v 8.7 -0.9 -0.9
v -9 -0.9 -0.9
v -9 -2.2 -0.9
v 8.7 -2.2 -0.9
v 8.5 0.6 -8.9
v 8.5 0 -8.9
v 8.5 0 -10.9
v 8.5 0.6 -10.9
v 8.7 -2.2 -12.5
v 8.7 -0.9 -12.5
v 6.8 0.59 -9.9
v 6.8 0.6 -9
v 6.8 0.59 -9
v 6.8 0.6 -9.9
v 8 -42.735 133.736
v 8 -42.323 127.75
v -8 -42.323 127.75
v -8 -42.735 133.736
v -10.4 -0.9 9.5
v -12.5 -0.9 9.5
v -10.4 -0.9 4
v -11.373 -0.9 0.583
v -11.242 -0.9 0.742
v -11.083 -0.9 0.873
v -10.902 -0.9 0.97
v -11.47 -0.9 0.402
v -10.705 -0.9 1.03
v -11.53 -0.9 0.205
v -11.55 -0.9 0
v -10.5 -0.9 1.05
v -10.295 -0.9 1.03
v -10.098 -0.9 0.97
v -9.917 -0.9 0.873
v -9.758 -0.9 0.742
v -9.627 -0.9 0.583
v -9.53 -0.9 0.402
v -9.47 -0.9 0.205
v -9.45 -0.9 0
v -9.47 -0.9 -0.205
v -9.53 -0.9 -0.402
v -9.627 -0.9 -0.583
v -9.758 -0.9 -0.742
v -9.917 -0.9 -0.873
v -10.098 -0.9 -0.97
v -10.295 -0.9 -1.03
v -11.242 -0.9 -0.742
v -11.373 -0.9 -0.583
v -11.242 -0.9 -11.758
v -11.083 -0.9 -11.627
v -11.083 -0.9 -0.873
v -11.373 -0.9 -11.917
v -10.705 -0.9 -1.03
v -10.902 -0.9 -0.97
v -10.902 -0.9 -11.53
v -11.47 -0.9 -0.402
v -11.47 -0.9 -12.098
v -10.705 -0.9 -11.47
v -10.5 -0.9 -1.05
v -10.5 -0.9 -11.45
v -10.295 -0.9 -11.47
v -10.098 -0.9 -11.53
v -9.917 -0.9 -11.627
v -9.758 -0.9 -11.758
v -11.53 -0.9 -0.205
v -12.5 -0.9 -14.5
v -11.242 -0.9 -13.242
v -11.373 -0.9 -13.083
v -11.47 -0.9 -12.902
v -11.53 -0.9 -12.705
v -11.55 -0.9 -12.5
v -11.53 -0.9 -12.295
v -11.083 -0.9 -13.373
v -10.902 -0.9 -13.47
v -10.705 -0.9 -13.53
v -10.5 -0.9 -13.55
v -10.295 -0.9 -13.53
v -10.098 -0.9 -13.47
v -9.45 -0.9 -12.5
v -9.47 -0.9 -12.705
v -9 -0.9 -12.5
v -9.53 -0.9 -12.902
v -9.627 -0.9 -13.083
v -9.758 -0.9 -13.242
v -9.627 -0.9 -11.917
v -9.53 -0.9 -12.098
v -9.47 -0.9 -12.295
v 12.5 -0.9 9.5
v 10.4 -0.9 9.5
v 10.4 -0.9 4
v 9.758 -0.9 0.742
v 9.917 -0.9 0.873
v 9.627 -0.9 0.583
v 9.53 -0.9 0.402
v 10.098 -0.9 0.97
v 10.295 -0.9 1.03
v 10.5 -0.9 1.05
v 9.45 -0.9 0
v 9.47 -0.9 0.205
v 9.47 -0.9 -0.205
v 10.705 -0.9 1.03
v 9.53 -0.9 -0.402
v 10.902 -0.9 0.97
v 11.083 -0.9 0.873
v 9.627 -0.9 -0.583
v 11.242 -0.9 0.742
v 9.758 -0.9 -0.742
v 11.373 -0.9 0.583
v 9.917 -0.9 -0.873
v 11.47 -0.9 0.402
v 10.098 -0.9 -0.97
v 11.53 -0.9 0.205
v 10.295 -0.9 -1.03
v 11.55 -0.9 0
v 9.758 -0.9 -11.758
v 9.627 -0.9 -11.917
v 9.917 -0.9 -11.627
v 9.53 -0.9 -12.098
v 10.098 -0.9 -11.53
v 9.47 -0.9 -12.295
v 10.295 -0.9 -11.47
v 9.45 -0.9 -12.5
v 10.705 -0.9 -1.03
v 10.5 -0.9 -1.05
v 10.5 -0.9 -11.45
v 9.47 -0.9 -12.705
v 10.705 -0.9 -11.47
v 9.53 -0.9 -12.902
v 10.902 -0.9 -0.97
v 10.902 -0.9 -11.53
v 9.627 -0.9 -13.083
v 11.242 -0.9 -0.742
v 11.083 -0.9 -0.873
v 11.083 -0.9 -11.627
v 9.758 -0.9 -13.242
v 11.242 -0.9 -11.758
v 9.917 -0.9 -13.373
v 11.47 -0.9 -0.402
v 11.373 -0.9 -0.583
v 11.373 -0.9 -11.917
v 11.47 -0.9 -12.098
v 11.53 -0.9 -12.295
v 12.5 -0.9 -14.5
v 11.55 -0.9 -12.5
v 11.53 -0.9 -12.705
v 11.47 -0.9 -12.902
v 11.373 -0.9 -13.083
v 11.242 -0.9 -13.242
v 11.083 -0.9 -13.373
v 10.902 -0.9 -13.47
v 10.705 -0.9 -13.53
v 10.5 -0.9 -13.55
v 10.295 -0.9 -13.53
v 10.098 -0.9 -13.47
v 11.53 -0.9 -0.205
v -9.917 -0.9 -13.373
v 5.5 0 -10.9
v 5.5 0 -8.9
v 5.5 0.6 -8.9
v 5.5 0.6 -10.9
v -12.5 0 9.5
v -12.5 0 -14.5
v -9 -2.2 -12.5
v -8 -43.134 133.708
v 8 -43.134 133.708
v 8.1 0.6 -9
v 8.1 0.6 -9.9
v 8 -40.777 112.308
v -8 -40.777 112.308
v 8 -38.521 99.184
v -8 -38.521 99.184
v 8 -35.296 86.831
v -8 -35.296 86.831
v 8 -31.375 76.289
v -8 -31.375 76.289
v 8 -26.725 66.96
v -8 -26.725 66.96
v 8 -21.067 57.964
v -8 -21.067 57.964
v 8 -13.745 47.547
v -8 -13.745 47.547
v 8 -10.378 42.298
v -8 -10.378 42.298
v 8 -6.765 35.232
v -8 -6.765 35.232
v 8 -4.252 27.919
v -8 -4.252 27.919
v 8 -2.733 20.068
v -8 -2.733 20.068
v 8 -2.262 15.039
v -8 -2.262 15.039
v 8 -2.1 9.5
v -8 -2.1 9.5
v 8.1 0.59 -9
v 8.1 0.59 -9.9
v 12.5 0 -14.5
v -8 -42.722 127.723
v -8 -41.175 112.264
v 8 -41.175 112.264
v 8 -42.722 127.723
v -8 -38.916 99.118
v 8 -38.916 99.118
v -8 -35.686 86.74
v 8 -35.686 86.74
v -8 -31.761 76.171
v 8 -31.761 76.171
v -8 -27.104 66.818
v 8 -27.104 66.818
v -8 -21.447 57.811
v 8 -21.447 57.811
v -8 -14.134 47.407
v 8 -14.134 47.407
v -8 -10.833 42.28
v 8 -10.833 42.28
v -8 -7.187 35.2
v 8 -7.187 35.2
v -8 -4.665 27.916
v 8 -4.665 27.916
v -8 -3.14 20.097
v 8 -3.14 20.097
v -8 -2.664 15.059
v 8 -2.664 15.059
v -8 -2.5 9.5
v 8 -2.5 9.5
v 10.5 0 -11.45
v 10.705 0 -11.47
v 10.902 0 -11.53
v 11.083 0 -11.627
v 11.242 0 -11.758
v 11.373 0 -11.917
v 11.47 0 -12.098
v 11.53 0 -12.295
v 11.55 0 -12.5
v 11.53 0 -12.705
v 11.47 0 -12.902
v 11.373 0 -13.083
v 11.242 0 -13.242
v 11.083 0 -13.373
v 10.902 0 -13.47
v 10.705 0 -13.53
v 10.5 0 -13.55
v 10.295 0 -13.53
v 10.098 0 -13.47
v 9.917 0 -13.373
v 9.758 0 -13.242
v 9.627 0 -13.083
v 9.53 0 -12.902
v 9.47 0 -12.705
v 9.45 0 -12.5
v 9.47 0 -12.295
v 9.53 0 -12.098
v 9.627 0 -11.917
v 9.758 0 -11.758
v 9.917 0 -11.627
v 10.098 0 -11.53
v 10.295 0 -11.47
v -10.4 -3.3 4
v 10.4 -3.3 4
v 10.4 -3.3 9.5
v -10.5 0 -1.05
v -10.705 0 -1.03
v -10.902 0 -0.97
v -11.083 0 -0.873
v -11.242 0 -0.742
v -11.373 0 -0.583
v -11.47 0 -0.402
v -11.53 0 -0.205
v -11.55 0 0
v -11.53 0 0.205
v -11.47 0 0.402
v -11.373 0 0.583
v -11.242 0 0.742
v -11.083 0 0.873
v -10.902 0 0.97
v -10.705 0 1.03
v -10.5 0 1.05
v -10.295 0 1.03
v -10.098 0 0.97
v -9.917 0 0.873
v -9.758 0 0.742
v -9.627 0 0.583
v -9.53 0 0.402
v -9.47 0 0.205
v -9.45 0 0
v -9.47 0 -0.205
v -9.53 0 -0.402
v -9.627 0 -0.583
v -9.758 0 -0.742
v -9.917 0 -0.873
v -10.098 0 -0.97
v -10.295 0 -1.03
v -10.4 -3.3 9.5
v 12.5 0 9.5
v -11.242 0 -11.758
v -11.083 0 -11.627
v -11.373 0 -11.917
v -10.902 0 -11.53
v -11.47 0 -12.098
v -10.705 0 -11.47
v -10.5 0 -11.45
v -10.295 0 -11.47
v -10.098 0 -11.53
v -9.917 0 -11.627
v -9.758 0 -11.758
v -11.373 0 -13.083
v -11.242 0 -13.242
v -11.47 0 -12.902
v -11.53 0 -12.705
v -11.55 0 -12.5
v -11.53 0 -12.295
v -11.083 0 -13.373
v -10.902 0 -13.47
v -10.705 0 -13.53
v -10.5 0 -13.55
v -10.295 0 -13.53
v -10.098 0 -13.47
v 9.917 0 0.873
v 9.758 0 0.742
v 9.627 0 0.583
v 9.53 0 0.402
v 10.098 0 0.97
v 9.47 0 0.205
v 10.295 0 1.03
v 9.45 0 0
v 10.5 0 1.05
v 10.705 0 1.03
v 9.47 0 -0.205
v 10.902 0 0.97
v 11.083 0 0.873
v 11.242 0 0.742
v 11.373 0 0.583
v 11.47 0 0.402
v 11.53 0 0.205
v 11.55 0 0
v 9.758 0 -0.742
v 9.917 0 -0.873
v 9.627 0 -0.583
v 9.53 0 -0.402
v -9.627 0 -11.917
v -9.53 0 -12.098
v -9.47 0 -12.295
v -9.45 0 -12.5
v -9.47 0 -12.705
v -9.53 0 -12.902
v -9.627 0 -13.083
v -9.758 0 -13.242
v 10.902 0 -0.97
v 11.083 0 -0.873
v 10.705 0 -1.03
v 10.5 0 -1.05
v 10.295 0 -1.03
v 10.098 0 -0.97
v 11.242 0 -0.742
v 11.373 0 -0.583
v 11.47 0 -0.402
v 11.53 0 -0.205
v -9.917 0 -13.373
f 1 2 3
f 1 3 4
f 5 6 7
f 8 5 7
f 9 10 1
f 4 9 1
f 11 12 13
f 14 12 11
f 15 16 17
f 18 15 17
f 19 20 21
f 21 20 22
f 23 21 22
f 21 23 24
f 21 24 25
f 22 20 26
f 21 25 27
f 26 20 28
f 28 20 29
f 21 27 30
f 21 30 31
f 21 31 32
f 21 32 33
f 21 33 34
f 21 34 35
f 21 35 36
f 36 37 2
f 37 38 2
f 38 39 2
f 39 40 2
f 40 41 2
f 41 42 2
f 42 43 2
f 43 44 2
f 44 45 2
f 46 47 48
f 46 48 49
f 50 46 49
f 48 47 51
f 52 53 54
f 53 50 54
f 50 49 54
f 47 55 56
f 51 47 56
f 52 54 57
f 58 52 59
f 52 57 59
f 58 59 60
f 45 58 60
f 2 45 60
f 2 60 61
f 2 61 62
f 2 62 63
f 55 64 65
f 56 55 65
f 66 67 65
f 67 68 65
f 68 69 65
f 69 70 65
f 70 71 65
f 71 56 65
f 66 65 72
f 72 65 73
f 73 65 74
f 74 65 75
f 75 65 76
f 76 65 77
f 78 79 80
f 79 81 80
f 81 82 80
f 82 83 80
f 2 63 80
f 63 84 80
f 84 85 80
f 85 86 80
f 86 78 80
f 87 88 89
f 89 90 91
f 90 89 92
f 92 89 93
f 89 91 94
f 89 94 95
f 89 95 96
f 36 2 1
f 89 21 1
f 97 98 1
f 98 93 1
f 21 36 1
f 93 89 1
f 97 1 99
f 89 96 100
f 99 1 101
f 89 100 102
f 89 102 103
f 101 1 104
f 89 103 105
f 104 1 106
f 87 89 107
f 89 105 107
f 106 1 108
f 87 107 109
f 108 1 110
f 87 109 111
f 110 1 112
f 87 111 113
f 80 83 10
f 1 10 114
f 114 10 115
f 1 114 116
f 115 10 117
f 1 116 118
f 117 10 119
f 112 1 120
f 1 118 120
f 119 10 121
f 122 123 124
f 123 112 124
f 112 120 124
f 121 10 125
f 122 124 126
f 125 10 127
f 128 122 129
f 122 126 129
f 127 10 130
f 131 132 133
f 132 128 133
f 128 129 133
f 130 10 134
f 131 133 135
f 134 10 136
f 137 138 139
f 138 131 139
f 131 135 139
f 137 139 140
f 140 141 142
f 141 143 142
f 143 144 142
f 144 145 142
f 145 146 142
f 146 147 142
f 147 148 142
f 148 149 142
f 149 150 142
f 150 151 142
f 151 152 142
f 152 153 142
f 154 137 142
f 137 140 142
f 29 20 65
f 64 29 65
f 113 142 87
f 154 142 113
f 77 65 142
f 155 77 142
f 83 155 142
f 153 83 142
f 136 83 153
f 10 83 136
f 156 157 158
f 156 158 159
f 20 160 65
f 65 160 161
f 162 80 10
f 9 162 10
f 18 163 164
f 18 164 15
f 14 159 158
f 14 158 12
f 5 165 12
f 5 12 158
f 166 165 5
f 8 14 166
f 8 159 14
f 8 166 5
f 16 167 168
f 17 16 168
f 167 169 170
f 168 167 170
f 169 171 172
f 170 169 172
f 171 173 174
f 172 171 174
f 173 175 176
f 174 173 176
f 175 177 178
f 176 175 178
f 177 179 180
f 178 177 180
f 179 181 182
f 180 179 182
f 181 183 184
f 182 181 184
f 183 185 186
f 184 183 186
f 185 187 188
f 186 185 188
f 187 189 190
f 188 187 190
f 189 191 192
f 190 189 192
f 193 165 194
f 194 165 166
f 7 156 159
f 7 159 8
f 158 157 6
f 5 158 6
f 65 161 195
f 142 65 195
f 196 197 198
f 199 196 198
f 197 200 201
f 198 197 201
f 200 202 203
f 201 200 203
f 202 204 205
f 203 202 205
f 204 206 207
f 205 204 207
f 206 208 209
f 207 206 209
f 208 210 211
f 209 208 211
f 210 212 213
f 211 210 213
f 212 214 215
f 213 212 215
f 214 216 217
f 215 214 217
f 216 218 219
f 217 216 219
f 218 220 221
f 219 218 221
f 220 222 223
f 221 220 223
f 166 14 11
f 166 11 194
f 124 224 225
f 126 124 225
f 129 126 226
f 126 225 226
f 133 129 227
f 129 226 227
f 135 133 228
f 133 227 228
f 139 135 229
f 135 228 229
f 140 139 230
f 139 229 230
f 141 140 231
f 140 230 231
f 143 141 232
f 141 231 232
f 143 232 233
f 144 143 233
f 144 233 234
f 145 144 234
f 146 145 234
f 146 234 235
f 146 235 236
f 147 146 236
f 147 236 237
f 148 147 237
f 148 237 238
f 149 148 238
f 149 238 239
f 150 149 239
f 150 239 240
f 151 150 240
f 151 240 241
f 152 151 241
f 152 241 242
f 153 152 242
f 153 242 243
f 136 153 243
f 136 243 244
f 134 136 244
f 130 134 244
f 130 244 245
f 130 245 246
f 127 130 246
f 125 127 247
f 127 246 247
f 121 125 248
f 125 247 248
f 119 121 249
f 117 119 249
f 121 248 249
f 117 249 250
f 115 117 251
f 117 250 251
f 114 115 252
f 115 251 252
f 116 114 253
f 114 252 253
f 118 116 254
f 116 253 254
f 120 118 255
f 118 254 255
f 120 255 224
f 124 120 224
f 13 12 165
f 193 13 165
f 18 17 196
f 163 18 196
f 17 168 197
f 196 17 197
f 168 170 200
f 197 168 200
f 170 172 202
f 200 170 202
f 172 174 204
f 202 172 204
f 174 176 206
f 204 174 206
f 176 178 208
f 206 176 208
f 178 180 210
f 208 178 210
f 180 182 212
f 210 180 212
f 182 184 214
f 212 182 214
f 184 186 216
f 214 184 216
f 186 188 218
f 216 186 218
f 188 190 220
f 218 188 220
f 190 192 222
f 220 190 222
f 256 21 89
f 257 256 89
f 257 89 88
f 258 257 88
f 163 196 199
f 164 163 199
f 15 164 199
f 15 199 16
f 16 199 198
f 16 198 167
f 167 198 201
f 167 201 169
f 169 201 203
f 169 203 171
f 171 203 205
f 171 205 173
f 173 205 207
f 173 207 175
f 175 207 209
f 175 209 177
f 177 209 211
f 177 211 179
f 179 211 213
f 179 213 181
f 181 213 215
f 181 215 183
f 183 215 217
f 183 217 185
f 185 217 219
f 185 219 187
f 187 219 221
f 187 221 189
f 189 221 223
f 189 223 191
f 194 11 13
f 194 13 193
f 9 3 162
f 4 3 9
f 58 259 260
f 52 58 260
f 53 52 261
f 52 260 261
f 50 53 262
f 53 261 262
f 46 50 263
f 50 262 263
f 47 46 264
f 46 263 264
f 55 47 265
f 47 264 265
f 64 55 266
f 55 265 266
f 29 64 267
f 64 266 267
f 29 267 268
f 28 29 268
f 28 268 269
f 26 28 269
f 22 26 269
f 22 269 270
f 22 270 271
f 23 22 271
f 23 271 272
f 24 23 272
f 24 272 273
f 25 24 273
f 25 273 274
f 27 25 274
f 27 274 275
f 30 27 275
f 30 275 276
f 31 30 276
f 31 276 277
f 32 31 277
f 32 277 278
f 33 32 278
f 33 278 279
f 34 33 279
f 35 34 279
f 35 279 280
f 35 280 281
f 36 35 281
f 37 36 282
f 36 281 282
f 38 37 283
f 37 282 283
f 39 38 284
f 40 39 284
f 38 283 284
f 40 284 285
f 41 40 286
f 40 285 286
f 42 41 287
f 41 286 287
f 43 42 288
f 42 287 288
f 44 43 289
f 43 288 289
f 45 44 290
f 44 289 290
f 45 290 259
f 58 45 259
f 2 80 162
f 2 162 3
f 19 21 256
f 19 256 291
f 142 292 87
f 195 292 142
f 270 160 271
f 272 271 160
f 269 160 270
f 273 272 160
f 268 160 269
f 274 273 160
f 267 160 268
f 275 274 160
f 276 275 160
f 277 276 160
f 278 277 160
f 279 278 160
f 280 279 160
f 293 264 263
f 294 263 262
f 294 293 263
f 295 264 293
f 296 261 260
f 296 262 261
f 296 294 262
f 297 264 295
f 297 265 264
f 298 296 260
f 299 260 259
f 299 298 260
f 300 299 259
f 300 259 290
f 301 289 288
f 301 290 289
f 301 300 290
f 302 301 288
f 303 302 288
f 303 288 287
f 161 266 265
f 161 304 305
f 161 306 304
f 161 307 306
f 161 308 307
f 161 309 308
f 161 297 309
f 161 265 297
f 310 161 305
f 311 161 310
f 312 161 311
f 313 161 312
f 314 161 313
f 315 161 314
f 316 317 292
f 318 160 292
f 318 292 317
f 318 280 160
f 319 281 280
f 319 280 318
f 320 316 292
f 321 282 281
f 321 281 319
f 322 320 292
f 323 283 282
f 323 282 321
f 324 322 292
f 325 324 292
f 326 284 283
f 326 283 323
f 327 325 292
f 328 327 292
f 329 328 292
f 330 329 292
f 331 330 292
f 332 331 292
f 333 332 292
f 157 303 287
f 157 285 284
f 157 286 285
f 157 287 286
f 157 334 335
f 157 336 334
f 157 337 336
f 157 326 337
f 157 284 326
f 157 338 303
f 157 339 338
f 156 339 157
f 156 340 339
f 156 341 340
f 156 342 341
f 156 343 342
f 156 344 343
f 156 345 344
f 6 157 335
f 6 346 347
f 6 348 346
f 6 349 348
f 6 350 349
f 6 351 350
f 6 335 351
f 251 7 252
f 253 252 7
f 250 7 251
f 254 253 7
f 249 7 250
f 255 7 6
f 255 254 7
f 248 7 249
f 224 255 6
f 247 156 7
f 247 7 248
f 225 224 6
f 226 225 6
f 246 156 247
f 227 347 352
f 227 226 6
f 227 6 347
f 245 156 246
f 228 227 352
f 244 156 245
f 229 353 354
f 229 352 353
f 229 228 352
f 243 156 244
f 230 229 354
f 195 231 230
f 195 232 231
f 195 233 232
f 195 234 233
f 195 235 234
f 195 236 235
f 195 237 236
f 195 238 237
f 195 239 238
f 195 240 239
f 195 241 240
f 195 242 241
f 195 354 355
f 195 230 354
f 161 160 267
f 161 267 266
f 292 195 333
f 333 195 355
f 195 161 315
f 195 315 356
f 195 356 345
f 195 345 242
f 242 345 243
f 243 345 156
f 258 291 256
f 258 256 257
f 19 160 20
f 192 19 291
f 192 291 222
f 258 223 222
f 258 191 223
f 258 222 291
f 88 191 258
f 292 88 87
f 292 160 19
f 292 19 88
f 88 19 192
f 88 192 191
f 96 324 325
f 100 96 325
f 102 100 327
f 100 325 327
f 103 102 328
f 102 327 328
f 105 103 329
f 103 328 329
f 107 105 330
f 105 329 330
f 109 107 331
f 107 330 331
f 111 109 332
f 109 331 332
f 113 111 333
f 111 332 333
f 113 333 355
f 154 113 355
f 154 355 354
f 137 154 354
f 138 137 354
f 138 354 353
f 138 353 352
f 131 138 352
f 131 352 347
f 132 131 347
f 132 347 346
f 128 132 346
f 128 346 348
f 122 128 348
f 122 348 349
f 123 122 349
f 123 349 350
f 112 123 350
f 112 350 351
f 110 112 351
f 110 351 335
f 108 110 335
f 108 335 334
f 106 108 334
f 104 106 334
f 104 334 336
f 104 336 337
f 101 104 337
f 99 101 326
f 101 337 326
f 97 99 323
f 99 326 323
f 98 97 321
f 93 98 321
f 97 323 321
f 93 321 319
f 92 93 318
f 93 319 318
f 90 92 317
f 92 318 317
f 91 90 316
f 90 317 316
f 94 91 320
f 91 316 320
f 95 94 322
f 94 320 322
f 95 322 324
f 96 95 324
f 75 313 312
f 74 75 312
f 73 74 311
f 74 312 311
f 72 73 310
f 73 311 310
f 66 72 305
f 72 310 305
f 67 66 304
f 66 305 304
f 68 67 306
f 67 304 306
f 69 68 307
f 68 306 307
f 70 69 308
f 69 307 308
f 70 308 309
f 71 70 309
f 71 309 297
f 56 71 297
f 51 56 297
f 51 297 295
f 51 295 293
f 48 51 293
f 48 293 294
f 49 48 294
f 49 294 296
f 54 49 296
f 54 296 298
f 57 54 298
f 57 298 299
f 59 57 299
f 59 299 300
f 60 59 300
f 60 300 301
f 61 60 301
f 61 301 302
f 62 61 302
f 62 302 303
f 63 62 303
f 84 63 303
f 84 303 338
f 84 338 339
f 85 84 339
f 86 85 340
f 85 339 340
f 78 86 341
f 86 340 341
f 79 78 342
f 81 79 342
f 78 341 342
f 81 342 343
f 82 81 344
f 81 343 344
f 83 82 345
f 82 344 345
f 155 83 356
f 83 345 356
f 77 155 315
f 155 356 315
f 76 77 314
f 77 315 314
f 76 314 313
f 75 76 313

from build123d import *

# Parameters (mm, degrees)
SKIZZE1_W                                 = 25
SKIZZE1_H                                 = 24
PCB_DEPTH                                 = 0.9
SKIZZE2_R                                 = 1.05
MOUNTING_HOLES_DEPTH                      = 20.165333287
SKIZZE3_W                                 = 20.8
SKIZZE3_H                                 = 5.5
CONNECTOR_CLOSED_DEPTH                    = 2.4
SKIZZE4_W                                 = 17.7
SKIZZE4_H                                 = 11.6
COMPONENTS_WORST_CASE_BOUNDARY_BOX_DEPTH  = 1.3
SKIZZE6_W                                 = 16
SKIZZE6_H                                 = 0.4
SKIZZE7_W                                 = 3
SKIZZE7_H                                 = 2
COMPONENTS_WORST_CASE_BOUNDARY_BOX2_DEPTH = 0.6
SKIZZE8_W                                 = 1.3
SKIZZE8_H                                 = 0.9
STATUS_LED_DEPTH                          = 0.01


with BuildPart() as part:
    # Skizze1 → PCB (new body)
    with BuildSketch(Plane(origin=(0, 0, 0), x_dir=(1, 0, 0), z_dir=(0, 1, 0))):
        with Locations((0, 2.5)):
            Rectangle(SKIZZE1_W, SKIZZE1_H)
    extrude(amount=-PCB_DEPTH)

    # Skizze2 → Mounting_Holes (cut, through all)
    with BuildSketch(Plane(origin=(0, 0, 0), x_dir=(1, 0, 0), z_dir=(0, 1, 0))):
        with Locations(Location((10.5, 12.5, 0), (0, 0, 270))):
            Circle(SKIZZE2_R)
        with Locations(Location((10.5, 0, 0), (0, 0, 270))):
            Circle(SKIZZE2_R)
        with Locations(Location((-10.5, 0, 0), (0, 0, 90))):
            Circle(SKIZZE2_R)
        with Locations(Location((-10.5, 12.5, 0), (0, 0, 90))):
            Circle(SKIZZE2_R)
    extrude(amount=-MOUNTING_HOLES_DEPTH, mode=Mode.SUBTRACT)

    # Skizze3 → Connector_closed (add)
    with BuildSketch(Plane.XZ.offset(0.9)):
        with Locations((0, 6.75)):
            Rectangle(SKIZZE3_W, SKIZZE3_H)
    extrude(amount=CONNECTOR_CLOSED_DEPTH)

    # Skizze4 → Components_worst-case_Boundary-Box (add)
    with BuildSketch(Plane.XZ.offset(0.9)):
        with Locations((-0.15, -6.7)):
            Rectangle(SKIZZE4_W, SKIZZE4_H)
    extrude(amount=COMPONENTS_WORST_CASE_BOUNDARY_BOX_DEPTH)

    # Cable_156mm_free_Length: sweep along a path in Skizze5
    with BuildLine() as cable_156mm_free_length_path:  # in the path sketch's own coordinates; laid on its plane below (add() does not lay a ready-made edge on the line's plane)
        Line((-133.7358537, -42.734939928), (-127.749991329, -42.323294834))
        add(Edge.make_bspline(
            [(-127.749991329, -42.323294834), (-47.264941103, -36.788373718), (-57.962969562, -2.1), (-9.5, -2.1)],
            knots=[0, 0, 0, 0, 1, 1, 1, 1], degree=3))
    # Skizze6 → Cable_156mm_free_Length (sweep)
    with BuildSketch(Plane.XY.offset(9.5)):
        with Locations((0, -2.3)):
            Rectangle(SKIZZE6_W, SKIZZE6_H)
    sweep(path=Plane(origin=(0, 0, 0), x_dir=(0, 0, -1), z_dir=(1, 0, 0)) * cable_156mm_free_length_path.line)

    # Skizze7 → Components_worst-case_Boundary-Box2 (add)
    with BuildSketch(Plane(origin=(0, 0, 0), x_dir=(1, 0, 0), z_dir=(0, 1, 0))):
        with Locations((7, 9.9)):
            Rectangle(SKIZZE7_W, SKIZZE7_H)
    extrude(amount=COMPONENTS_WORST_CASE_BOUNDARY_BOX2_DEPTH)

    # Skizze8 → Status_LED (cut)
    with BuildSketch(Plane(origin=(0, 0.6, 0), x_dir=(1, 0, 0), z_dir=(0, 1, 0))):
        with Locations((7.45, 9.45)):
            Rectangle(SKIZZE8_W, SKIZZE8_H)
    extrude(amount=-STATUS_LED_DEPTH, mode=Mode.SUBTRACT)


solid = part.part
